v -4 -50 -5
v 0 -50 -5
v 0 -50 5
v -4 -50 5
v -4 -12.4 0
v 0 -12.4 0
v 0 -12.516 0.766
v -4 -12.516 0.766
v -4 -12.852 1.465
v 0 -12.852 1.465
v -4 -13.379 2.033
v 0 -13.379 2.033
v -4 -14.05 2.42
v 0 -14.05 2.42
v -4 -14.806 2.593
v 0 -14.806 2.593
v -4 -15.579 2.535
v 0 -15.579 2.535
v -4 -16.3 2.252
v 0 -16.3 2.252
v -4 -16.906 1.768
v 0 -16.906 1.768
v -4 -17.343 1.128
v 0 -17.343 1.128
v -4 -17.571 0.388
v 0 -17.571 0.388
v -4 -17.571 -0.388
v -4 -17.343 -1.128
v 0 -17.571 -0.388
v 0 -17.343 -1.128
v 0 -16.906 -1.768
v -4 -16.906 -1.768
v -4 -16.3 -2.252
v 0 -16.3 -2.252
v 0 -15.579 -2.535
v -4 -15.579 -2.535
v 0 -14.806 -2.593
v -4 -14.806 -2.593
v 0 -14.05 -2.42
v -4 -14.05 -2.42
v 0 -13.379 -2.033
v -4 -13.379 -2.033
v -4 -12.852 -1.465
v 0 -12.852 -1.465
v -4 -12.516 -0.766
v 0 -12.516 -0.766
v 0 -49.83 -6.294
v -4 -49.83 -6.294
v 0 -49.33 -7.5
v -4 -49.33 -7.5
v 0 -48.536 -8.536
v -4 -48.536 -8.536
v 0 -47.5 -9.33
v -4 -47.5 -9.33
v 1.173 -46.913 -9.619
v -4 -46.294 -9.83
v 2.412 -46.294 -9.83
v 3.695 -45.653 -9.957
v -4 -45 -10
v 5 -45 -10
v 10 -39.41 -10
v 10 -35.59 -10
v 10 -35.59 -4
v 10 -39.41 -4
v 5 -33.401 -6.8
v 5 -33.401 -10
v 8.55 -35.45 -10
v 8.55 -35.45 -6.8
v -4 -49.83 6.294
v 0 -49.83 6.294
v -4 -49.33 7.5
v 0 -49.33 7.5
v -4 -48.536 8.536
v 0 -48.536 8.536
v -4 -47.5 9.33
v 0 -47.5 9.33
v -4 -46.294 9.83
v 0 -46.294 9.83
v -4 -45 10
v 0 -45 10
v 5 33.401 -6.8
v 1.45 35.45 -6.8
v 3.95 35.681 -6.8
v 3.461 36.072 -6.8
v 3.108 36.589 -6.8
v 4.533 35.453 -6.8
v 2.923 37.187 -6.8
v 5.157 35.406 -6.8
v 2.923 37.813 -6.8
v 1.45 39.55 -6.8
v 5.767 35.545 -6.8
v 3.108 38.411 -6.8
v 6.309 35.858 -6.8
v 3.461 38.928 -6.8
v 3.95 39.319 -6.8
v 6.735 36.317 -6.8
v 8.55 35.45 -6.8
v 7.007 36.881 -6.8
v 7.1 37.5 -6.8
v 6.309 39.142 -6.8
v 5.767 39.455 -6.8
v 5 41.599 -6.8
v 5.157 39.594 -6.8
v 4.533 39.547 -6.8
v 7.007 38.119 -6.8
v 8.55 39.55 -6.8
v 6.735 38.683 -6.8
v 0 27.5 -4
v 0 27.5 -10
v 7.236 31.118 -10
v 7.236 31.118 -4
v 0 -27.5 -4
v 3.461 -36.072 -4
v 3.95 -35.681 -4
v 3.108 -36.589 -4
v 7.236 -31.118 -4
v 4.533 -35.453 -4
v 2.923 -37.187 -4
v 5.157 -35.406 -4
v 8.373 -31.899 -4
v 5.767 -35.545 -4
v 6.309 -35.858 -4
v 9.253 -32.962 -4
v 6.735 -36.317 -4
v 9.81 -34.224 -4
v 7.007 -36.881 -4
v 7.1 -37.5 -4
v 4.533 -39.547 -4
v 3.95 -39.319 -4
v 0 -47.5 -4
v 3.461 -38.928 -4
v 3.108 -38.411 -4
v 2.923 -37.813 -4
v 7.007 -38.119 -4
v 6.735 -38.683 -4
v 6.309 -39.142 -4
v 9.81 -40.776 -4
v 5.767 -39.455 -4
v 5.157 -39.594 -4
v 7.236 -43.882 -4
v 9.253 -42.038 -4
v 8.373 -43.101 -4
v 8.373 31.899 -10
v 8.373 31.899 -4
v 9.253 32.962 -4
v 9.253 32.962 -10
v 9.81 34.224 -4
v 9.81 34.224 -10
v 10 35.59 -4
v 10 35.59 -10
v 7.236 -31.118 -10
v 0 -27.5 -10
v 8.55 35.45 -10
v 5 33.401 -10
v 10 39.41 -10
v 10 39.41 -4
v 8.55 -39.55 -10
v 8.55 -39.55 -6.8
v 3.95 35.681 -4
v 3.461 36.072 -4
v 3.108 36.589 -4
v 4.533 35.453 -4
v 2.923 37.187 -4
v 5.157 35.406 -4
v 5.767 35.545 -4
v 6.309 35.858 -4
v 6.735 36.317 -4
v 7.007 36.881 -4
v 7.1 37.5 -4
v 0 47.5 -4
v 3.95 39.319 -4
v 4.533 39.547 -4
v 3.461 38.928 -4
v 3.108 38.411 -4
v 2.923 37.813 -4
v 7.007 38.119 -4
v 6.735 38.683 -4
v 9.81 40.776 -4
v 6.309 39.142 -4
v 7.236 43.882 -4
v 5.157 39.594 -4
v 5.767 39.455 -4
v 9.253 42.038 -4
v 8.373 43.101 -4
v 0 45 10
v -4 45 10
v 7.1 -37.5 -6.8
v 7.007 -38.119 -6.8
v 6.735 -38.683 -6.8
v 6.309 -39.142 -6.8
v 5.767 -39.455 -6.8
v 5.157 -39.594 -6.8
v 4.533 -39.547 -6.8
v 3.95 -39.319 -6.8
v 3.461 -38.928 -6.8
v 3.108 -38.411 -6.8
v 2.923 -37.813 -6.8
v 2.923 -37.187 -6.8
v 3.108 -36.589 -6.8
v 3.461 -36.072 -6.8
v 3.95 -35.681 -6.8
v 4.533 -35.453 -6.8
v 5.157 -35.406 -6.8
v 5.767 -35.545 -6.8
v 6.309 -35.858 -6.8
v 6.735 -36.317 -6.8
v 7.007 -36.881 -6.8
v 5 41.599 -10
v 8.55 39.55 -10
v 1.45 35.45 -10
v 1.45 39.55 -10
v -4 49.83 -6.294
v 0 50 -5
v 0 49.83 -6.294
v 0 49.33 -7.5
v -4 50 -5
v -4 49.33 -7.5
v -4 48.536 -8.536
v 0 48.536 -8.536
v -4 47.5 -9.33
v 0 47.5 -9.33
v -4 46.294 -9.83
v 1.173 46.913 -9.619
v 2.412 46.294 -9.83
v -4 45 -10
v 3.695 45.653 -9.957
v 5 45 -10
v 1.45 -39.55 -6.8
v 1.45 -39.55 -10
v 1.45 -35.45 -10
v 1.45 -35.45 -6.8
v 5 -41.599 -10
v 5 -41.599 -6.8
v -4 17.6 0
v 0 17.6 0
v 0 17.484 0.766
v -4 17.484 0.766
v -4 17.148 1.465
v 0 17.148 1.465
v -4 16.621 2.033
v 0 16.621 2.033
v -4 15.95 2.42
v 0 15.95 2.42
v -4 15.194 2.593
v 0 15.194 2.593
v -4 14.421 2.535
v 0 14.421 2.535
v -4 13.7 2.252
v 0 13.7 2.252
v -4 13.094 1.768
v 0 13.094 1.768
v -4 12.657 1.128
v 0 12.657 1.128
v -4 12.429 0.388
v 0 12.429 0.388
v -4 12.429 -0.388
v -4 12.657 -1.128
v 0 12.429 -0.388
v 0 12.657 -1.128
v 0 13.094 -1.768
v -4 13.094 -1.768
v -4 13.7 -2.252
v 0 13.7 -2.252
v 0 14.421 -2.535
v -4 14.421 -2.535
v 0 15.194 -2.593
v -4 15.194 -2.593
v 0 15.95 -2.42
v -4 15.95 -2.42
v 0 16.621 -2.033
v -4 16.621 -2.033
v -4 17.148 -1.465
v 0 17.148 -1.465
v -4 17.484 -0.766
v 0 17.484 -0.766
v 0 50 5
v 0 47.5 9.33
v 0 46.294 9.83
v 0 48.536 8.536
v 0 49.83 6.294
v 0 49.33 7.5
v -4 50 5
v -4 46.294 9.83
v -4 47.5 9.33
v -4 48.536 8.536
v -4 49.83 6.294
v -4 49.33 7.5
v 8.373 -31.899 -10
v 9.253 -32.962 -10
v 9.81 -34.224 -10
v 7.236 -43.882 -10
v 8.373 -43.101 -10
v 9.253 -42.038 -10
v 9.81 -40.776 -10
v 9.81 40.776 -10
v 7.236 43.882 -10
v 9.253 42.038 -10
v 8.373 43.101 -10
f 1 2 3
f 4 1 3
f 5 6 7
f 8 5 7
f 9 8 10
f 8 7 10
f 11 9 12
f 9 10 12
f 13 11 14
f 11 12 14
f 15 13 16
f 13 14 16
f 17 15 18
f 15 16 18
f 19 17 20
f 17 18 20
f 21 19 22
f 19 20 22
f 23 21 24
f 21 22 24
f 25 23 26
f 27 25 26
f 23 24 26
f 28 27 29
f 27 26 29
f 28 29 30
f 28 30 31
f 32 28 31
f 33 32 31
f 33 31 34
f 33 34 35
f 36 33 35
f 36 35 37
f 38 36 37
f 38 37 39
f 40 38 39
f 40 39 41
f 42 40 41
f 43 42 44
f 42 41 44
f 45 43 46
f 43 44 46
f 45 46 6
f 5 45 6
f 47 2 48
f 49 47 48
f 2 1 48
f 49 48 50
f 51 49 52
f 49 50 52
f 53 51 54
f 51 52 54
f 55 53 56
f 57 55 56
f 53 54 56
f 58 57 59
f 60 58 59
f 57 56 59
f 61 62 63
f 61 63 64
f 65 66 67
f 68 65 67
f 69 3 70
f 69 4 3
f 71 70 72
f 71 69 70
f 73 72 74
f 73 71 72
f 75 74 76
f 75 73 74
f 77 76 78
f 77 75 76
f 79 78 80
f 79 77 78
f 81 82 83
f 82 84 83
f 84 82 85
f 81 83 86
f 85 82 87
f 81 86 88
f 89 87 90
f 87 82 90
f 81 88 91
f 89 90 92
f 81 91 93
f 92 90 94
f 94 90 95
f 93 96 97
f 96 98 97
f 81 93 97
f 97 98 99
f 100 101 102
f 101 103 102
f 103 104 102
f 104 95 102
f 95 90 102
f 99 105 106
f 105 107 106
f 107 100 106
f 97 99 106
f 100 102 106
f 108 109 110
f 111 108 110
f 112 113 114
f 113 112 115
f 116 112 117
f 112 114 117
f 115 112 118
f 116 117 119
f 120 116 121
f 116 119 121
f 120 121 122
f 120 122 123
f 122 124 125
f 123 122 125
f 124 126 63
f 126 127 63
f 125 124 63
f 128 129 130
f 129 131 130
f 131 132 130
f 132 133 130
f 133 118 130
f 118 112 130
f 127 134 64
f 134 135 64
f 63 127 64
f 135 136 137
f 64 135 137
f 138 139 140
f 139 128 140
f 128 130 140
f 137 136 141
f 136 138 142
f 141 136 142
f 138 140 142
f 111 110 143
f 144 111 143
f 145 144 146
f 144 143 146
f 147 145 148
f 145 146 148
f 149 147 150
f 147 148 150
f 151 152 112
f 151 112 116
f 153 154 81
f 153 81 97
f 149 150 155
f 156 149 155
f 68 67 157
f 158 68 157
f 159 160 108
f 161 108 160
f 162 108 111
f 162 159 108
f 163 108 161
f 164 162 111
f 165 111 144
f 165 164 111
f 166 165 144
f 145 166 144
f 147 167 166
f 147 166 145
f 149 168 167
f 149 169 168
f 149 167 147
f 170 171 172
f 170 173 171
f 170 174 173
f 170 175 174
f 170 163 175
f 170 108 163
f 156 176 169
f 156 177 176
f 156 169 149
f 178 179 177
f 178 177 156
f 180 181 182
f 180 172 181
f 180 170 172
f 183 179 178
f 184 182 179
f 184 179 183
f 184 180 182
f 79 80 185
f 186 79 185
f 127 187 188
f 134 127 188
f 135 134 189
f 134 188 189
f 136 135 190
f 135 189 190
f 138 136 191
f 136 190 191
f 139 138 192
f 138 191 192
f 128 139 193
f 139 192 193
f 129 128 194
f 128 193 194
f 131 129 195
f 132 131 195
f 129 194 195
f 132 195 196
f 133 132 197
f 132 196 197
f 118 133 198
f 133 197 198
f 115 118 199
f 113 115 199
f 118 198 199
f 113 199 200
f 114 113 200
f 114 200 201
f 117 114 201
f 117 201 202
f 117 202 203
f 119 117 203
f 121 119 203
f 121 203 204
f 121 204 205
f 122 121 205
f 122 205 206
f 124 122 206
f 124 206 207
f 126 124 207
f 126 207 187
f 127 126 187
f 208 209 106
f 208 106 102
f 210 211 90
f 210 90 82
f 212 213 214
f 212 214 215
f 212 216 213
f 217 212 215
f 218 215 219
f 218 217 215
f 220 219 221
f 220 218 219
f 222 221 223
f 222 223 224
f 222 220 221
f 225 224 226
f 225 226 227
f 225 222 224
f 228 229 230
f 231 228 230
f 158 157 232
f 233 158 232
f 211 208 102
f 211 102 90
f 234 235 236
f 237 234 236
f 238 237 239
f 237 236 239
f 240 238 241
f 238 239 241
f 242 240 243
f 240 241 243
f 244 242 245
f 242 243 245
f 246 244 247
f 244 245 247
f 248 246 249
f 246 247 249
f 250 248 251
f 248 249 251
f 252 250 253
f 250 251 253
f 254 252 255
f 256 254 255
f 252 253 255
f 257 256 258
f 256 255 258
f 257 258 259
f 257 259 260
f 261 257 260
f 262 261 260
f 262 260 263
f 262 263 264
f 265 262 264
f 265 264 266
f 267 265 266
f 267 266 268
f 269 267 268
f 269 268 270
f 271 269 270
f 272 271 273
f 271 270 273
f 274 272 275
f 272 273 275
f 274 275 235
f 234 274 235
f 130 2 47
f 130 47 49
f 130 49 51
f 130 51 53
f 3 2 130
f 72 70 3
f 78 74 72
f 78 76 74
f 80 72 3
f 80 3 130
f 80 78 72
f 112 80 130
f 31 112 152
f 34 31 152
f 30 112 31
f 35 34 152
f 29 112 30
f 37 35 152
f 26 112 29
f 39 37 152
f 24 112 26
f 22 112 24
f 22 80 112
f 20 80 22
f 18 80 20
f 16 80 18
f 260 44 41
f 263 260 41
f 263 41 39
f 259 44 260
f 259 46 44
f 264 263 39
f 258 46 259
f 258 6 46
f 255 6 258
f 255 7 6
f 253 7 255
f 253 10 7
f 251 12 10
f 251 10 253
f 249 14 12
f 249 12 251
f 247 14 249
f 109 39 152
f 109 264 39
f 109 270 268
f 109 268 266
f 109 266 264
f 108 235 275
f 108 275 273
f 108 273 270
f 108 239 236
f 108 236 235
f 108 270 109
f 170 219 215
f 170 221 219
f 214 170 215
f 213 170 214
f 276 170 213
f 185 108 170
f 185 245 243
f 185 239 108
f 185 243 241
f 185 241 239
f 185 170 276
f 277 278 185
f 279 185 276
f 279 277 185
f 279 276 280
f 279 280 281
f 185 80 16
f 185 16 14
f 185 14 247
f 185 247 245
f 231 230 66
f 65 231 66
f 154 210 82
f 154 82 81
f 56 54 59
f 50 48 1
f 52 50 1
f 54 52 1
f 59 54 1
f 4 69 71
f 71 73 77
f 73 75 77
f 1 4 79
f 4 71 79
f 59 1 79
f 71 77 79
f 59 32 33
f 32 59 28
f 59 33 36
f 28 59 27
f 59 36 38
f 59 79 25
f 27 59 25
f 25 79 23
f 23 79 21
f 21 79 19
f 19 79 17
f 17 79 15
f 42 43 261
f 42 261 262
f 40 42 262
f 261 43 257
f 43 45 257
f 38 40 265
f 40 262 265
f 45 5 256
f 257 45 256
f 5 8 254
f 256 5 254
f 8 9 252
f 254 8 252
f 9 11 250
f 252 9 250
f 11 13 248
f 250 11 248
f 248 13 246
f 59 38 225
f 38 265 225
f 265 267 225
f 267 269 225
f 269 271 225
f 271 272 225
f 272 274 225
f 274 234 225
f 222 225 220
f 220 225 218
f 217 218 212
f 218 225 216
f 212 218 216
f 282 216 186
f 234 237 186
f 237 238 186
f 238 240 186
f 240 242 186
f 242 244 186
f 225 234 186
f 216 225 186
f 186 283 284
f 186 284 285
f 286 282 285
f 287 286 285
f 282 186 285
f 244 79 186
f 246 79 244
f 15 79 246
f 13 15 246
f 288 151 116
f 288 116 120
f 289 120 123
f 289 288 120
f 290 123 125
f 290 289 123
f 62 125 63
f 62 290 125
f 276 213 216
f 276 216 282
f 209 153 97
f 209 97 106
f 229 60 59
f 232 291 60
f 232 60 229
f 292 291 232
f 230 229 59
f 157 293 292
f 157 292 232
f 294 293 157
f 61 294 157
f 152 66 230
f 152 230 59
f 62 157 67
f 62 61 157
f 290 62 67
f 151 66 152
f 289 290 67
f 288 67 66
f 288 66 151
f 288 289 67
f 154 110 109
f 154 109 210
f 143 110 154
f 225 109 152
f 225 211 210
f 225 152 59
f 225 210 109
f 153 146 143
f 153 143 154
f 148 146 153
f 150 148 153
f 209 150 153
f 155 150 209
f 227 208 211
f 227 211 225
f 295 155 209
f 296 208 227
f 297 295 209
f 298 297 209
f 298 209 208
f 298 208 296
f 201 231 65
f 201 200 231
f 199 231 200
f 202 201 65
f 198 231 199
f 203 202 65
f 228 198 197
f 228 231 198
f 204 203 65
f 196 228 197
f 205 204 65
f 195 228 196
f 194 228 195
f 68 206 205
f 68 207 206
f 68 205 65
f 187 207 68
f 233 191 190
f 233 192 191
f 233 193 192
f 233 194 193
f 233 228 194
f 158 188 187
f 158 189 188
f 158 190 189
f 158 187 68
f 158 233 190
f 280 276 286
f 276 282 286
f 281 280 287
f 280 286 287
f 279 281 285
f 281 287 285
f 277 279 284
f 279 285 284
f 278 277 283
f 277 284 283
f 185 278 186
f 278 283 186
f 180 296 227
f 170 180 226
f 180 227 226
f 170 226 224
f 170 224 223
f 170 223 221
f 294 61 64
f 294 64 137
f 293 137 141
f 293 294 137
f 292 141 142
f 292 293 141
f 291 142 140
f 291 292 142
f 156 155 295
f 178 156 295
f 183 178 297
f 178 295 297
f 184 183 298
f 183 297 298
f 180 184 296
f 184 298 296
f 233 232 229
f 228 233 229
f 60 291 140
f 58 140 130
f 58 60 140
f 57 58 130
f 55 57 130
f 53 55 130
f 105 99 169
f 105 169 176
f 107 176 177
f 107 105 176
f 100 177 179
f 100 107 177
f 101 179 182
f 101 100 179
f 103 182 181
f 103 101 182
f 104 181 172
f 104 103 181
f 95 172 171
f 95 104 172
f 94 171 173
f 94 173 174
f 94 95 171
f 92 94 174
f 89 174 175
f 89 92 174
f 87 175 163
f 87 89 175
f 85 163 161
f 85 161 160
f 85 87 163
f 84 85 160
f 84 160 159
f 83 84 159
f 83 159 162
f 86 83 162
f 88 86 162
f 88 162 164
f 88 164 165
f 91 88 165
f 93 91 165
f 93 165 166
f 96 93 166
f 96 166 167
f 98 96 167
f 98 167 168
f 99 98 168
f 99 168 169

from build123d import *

# Parameters (mm, degrees)
F0_W     = 100
F0_H     = 20
F0_R     = 2.6
F1_DEPTH = 4
F2_R     = 2.1
F3_DEPTH = 6
F4_DEPTH = 3.2
F6_R     = 5


with BuildPart() as f1:
    # F0 (on Right) → F1 (new body)
    with BuildSketch(Plane.YZ):
        Rectangle(F0_W, F0_H)
        with Locations((-15, 0)):
            Circle(F0_R, mode=Mode.SUBTRACT)
        with Locations((15, 0)):
            Circle(F0_R, mode=Mode.SUBTRACT)
    extrude(amount=-F1_DEPTH)

    # F2 (on face) → F3 (join)
    with BuildSketch(Plane(origin=(0, 0, -10), x_dir=(1, 0, 0), z_dir=(0, 0, -1))):
        with BuildLine():
            Line((7.2360679775, 43.8819660113), (0, 47.5))
            Line((0, 47.5), (0, 27.5))
            Line((0, 27.5), (7.2360679775, 31.1180339887))
            ThreePointArc((7.2360679775, 31.1180339887), (9.2532540418, 32.9615143832), (10, 35.5901699437))
            Line((10, 35.5901699437), (10, 39.4098300563))
            ThreePointArc((10, 39.4098300563), (9.2532540418, 42.0384856168), (7.2360679775, 43.8819660113))
        make_face()
        Polygon((5, 41.5991869112), (8.55, 39.5495934556), (8.55, 35.4504065444), (5, 33.4008130888), (1.45, 35.4504065444), (1.45, 39.5495934556), align=None, mode=Mode.SUBTRACT)
        Polygon((8.55, 35.4504065444), (8.55, 39.5495934556), (5, 41.5991869112), (1.45, 39.5495934556), (1.45, 35.4504065444), (5, 33.4008130888), align=None)
        with Locations((5, 37.5)):
            Circle(F2_R, mode=Mode.SUBTRACT)
    extrude(amount=-F3_DEPTH)

    # F2 (on face) → F4 (cut)
    with BuildSketch(Plane(origin=(0, 0, -10), x_dir=(1, 0, 0), z_dir=(0, 0, -1))):
        Polygon((8.55, 35.4504065444), (8.55, 39.5495934556), (5, 41.5991869112), (1.45, 39.5495934556), (1.45, 35.4504065444), (5, 33.4008130888), align=None)
        with Locations((5, 37.5)):
            Circle(F2_R, mode=Mode.SUBTRACT)
    extrude(amount=-F4_DEPTH, mode=Mode.SUBTRACT)

    # F5: F1 across plane


with BuildPart() as f1_1:
    add(f1.part)
    add(f1.part.mirror(Plane.XZ))

    # F6
    f6_edges = [f1_1.edges().sort_by_distance(p)[0] for p in [
        (-2, -50, 10),
        (-2, -50, -10),
        (-2, 50, -10),
        (-2, 50, 10),
    ]]
    fillet(f6_edges, radius=F6_R)


solid = f1_1.part
